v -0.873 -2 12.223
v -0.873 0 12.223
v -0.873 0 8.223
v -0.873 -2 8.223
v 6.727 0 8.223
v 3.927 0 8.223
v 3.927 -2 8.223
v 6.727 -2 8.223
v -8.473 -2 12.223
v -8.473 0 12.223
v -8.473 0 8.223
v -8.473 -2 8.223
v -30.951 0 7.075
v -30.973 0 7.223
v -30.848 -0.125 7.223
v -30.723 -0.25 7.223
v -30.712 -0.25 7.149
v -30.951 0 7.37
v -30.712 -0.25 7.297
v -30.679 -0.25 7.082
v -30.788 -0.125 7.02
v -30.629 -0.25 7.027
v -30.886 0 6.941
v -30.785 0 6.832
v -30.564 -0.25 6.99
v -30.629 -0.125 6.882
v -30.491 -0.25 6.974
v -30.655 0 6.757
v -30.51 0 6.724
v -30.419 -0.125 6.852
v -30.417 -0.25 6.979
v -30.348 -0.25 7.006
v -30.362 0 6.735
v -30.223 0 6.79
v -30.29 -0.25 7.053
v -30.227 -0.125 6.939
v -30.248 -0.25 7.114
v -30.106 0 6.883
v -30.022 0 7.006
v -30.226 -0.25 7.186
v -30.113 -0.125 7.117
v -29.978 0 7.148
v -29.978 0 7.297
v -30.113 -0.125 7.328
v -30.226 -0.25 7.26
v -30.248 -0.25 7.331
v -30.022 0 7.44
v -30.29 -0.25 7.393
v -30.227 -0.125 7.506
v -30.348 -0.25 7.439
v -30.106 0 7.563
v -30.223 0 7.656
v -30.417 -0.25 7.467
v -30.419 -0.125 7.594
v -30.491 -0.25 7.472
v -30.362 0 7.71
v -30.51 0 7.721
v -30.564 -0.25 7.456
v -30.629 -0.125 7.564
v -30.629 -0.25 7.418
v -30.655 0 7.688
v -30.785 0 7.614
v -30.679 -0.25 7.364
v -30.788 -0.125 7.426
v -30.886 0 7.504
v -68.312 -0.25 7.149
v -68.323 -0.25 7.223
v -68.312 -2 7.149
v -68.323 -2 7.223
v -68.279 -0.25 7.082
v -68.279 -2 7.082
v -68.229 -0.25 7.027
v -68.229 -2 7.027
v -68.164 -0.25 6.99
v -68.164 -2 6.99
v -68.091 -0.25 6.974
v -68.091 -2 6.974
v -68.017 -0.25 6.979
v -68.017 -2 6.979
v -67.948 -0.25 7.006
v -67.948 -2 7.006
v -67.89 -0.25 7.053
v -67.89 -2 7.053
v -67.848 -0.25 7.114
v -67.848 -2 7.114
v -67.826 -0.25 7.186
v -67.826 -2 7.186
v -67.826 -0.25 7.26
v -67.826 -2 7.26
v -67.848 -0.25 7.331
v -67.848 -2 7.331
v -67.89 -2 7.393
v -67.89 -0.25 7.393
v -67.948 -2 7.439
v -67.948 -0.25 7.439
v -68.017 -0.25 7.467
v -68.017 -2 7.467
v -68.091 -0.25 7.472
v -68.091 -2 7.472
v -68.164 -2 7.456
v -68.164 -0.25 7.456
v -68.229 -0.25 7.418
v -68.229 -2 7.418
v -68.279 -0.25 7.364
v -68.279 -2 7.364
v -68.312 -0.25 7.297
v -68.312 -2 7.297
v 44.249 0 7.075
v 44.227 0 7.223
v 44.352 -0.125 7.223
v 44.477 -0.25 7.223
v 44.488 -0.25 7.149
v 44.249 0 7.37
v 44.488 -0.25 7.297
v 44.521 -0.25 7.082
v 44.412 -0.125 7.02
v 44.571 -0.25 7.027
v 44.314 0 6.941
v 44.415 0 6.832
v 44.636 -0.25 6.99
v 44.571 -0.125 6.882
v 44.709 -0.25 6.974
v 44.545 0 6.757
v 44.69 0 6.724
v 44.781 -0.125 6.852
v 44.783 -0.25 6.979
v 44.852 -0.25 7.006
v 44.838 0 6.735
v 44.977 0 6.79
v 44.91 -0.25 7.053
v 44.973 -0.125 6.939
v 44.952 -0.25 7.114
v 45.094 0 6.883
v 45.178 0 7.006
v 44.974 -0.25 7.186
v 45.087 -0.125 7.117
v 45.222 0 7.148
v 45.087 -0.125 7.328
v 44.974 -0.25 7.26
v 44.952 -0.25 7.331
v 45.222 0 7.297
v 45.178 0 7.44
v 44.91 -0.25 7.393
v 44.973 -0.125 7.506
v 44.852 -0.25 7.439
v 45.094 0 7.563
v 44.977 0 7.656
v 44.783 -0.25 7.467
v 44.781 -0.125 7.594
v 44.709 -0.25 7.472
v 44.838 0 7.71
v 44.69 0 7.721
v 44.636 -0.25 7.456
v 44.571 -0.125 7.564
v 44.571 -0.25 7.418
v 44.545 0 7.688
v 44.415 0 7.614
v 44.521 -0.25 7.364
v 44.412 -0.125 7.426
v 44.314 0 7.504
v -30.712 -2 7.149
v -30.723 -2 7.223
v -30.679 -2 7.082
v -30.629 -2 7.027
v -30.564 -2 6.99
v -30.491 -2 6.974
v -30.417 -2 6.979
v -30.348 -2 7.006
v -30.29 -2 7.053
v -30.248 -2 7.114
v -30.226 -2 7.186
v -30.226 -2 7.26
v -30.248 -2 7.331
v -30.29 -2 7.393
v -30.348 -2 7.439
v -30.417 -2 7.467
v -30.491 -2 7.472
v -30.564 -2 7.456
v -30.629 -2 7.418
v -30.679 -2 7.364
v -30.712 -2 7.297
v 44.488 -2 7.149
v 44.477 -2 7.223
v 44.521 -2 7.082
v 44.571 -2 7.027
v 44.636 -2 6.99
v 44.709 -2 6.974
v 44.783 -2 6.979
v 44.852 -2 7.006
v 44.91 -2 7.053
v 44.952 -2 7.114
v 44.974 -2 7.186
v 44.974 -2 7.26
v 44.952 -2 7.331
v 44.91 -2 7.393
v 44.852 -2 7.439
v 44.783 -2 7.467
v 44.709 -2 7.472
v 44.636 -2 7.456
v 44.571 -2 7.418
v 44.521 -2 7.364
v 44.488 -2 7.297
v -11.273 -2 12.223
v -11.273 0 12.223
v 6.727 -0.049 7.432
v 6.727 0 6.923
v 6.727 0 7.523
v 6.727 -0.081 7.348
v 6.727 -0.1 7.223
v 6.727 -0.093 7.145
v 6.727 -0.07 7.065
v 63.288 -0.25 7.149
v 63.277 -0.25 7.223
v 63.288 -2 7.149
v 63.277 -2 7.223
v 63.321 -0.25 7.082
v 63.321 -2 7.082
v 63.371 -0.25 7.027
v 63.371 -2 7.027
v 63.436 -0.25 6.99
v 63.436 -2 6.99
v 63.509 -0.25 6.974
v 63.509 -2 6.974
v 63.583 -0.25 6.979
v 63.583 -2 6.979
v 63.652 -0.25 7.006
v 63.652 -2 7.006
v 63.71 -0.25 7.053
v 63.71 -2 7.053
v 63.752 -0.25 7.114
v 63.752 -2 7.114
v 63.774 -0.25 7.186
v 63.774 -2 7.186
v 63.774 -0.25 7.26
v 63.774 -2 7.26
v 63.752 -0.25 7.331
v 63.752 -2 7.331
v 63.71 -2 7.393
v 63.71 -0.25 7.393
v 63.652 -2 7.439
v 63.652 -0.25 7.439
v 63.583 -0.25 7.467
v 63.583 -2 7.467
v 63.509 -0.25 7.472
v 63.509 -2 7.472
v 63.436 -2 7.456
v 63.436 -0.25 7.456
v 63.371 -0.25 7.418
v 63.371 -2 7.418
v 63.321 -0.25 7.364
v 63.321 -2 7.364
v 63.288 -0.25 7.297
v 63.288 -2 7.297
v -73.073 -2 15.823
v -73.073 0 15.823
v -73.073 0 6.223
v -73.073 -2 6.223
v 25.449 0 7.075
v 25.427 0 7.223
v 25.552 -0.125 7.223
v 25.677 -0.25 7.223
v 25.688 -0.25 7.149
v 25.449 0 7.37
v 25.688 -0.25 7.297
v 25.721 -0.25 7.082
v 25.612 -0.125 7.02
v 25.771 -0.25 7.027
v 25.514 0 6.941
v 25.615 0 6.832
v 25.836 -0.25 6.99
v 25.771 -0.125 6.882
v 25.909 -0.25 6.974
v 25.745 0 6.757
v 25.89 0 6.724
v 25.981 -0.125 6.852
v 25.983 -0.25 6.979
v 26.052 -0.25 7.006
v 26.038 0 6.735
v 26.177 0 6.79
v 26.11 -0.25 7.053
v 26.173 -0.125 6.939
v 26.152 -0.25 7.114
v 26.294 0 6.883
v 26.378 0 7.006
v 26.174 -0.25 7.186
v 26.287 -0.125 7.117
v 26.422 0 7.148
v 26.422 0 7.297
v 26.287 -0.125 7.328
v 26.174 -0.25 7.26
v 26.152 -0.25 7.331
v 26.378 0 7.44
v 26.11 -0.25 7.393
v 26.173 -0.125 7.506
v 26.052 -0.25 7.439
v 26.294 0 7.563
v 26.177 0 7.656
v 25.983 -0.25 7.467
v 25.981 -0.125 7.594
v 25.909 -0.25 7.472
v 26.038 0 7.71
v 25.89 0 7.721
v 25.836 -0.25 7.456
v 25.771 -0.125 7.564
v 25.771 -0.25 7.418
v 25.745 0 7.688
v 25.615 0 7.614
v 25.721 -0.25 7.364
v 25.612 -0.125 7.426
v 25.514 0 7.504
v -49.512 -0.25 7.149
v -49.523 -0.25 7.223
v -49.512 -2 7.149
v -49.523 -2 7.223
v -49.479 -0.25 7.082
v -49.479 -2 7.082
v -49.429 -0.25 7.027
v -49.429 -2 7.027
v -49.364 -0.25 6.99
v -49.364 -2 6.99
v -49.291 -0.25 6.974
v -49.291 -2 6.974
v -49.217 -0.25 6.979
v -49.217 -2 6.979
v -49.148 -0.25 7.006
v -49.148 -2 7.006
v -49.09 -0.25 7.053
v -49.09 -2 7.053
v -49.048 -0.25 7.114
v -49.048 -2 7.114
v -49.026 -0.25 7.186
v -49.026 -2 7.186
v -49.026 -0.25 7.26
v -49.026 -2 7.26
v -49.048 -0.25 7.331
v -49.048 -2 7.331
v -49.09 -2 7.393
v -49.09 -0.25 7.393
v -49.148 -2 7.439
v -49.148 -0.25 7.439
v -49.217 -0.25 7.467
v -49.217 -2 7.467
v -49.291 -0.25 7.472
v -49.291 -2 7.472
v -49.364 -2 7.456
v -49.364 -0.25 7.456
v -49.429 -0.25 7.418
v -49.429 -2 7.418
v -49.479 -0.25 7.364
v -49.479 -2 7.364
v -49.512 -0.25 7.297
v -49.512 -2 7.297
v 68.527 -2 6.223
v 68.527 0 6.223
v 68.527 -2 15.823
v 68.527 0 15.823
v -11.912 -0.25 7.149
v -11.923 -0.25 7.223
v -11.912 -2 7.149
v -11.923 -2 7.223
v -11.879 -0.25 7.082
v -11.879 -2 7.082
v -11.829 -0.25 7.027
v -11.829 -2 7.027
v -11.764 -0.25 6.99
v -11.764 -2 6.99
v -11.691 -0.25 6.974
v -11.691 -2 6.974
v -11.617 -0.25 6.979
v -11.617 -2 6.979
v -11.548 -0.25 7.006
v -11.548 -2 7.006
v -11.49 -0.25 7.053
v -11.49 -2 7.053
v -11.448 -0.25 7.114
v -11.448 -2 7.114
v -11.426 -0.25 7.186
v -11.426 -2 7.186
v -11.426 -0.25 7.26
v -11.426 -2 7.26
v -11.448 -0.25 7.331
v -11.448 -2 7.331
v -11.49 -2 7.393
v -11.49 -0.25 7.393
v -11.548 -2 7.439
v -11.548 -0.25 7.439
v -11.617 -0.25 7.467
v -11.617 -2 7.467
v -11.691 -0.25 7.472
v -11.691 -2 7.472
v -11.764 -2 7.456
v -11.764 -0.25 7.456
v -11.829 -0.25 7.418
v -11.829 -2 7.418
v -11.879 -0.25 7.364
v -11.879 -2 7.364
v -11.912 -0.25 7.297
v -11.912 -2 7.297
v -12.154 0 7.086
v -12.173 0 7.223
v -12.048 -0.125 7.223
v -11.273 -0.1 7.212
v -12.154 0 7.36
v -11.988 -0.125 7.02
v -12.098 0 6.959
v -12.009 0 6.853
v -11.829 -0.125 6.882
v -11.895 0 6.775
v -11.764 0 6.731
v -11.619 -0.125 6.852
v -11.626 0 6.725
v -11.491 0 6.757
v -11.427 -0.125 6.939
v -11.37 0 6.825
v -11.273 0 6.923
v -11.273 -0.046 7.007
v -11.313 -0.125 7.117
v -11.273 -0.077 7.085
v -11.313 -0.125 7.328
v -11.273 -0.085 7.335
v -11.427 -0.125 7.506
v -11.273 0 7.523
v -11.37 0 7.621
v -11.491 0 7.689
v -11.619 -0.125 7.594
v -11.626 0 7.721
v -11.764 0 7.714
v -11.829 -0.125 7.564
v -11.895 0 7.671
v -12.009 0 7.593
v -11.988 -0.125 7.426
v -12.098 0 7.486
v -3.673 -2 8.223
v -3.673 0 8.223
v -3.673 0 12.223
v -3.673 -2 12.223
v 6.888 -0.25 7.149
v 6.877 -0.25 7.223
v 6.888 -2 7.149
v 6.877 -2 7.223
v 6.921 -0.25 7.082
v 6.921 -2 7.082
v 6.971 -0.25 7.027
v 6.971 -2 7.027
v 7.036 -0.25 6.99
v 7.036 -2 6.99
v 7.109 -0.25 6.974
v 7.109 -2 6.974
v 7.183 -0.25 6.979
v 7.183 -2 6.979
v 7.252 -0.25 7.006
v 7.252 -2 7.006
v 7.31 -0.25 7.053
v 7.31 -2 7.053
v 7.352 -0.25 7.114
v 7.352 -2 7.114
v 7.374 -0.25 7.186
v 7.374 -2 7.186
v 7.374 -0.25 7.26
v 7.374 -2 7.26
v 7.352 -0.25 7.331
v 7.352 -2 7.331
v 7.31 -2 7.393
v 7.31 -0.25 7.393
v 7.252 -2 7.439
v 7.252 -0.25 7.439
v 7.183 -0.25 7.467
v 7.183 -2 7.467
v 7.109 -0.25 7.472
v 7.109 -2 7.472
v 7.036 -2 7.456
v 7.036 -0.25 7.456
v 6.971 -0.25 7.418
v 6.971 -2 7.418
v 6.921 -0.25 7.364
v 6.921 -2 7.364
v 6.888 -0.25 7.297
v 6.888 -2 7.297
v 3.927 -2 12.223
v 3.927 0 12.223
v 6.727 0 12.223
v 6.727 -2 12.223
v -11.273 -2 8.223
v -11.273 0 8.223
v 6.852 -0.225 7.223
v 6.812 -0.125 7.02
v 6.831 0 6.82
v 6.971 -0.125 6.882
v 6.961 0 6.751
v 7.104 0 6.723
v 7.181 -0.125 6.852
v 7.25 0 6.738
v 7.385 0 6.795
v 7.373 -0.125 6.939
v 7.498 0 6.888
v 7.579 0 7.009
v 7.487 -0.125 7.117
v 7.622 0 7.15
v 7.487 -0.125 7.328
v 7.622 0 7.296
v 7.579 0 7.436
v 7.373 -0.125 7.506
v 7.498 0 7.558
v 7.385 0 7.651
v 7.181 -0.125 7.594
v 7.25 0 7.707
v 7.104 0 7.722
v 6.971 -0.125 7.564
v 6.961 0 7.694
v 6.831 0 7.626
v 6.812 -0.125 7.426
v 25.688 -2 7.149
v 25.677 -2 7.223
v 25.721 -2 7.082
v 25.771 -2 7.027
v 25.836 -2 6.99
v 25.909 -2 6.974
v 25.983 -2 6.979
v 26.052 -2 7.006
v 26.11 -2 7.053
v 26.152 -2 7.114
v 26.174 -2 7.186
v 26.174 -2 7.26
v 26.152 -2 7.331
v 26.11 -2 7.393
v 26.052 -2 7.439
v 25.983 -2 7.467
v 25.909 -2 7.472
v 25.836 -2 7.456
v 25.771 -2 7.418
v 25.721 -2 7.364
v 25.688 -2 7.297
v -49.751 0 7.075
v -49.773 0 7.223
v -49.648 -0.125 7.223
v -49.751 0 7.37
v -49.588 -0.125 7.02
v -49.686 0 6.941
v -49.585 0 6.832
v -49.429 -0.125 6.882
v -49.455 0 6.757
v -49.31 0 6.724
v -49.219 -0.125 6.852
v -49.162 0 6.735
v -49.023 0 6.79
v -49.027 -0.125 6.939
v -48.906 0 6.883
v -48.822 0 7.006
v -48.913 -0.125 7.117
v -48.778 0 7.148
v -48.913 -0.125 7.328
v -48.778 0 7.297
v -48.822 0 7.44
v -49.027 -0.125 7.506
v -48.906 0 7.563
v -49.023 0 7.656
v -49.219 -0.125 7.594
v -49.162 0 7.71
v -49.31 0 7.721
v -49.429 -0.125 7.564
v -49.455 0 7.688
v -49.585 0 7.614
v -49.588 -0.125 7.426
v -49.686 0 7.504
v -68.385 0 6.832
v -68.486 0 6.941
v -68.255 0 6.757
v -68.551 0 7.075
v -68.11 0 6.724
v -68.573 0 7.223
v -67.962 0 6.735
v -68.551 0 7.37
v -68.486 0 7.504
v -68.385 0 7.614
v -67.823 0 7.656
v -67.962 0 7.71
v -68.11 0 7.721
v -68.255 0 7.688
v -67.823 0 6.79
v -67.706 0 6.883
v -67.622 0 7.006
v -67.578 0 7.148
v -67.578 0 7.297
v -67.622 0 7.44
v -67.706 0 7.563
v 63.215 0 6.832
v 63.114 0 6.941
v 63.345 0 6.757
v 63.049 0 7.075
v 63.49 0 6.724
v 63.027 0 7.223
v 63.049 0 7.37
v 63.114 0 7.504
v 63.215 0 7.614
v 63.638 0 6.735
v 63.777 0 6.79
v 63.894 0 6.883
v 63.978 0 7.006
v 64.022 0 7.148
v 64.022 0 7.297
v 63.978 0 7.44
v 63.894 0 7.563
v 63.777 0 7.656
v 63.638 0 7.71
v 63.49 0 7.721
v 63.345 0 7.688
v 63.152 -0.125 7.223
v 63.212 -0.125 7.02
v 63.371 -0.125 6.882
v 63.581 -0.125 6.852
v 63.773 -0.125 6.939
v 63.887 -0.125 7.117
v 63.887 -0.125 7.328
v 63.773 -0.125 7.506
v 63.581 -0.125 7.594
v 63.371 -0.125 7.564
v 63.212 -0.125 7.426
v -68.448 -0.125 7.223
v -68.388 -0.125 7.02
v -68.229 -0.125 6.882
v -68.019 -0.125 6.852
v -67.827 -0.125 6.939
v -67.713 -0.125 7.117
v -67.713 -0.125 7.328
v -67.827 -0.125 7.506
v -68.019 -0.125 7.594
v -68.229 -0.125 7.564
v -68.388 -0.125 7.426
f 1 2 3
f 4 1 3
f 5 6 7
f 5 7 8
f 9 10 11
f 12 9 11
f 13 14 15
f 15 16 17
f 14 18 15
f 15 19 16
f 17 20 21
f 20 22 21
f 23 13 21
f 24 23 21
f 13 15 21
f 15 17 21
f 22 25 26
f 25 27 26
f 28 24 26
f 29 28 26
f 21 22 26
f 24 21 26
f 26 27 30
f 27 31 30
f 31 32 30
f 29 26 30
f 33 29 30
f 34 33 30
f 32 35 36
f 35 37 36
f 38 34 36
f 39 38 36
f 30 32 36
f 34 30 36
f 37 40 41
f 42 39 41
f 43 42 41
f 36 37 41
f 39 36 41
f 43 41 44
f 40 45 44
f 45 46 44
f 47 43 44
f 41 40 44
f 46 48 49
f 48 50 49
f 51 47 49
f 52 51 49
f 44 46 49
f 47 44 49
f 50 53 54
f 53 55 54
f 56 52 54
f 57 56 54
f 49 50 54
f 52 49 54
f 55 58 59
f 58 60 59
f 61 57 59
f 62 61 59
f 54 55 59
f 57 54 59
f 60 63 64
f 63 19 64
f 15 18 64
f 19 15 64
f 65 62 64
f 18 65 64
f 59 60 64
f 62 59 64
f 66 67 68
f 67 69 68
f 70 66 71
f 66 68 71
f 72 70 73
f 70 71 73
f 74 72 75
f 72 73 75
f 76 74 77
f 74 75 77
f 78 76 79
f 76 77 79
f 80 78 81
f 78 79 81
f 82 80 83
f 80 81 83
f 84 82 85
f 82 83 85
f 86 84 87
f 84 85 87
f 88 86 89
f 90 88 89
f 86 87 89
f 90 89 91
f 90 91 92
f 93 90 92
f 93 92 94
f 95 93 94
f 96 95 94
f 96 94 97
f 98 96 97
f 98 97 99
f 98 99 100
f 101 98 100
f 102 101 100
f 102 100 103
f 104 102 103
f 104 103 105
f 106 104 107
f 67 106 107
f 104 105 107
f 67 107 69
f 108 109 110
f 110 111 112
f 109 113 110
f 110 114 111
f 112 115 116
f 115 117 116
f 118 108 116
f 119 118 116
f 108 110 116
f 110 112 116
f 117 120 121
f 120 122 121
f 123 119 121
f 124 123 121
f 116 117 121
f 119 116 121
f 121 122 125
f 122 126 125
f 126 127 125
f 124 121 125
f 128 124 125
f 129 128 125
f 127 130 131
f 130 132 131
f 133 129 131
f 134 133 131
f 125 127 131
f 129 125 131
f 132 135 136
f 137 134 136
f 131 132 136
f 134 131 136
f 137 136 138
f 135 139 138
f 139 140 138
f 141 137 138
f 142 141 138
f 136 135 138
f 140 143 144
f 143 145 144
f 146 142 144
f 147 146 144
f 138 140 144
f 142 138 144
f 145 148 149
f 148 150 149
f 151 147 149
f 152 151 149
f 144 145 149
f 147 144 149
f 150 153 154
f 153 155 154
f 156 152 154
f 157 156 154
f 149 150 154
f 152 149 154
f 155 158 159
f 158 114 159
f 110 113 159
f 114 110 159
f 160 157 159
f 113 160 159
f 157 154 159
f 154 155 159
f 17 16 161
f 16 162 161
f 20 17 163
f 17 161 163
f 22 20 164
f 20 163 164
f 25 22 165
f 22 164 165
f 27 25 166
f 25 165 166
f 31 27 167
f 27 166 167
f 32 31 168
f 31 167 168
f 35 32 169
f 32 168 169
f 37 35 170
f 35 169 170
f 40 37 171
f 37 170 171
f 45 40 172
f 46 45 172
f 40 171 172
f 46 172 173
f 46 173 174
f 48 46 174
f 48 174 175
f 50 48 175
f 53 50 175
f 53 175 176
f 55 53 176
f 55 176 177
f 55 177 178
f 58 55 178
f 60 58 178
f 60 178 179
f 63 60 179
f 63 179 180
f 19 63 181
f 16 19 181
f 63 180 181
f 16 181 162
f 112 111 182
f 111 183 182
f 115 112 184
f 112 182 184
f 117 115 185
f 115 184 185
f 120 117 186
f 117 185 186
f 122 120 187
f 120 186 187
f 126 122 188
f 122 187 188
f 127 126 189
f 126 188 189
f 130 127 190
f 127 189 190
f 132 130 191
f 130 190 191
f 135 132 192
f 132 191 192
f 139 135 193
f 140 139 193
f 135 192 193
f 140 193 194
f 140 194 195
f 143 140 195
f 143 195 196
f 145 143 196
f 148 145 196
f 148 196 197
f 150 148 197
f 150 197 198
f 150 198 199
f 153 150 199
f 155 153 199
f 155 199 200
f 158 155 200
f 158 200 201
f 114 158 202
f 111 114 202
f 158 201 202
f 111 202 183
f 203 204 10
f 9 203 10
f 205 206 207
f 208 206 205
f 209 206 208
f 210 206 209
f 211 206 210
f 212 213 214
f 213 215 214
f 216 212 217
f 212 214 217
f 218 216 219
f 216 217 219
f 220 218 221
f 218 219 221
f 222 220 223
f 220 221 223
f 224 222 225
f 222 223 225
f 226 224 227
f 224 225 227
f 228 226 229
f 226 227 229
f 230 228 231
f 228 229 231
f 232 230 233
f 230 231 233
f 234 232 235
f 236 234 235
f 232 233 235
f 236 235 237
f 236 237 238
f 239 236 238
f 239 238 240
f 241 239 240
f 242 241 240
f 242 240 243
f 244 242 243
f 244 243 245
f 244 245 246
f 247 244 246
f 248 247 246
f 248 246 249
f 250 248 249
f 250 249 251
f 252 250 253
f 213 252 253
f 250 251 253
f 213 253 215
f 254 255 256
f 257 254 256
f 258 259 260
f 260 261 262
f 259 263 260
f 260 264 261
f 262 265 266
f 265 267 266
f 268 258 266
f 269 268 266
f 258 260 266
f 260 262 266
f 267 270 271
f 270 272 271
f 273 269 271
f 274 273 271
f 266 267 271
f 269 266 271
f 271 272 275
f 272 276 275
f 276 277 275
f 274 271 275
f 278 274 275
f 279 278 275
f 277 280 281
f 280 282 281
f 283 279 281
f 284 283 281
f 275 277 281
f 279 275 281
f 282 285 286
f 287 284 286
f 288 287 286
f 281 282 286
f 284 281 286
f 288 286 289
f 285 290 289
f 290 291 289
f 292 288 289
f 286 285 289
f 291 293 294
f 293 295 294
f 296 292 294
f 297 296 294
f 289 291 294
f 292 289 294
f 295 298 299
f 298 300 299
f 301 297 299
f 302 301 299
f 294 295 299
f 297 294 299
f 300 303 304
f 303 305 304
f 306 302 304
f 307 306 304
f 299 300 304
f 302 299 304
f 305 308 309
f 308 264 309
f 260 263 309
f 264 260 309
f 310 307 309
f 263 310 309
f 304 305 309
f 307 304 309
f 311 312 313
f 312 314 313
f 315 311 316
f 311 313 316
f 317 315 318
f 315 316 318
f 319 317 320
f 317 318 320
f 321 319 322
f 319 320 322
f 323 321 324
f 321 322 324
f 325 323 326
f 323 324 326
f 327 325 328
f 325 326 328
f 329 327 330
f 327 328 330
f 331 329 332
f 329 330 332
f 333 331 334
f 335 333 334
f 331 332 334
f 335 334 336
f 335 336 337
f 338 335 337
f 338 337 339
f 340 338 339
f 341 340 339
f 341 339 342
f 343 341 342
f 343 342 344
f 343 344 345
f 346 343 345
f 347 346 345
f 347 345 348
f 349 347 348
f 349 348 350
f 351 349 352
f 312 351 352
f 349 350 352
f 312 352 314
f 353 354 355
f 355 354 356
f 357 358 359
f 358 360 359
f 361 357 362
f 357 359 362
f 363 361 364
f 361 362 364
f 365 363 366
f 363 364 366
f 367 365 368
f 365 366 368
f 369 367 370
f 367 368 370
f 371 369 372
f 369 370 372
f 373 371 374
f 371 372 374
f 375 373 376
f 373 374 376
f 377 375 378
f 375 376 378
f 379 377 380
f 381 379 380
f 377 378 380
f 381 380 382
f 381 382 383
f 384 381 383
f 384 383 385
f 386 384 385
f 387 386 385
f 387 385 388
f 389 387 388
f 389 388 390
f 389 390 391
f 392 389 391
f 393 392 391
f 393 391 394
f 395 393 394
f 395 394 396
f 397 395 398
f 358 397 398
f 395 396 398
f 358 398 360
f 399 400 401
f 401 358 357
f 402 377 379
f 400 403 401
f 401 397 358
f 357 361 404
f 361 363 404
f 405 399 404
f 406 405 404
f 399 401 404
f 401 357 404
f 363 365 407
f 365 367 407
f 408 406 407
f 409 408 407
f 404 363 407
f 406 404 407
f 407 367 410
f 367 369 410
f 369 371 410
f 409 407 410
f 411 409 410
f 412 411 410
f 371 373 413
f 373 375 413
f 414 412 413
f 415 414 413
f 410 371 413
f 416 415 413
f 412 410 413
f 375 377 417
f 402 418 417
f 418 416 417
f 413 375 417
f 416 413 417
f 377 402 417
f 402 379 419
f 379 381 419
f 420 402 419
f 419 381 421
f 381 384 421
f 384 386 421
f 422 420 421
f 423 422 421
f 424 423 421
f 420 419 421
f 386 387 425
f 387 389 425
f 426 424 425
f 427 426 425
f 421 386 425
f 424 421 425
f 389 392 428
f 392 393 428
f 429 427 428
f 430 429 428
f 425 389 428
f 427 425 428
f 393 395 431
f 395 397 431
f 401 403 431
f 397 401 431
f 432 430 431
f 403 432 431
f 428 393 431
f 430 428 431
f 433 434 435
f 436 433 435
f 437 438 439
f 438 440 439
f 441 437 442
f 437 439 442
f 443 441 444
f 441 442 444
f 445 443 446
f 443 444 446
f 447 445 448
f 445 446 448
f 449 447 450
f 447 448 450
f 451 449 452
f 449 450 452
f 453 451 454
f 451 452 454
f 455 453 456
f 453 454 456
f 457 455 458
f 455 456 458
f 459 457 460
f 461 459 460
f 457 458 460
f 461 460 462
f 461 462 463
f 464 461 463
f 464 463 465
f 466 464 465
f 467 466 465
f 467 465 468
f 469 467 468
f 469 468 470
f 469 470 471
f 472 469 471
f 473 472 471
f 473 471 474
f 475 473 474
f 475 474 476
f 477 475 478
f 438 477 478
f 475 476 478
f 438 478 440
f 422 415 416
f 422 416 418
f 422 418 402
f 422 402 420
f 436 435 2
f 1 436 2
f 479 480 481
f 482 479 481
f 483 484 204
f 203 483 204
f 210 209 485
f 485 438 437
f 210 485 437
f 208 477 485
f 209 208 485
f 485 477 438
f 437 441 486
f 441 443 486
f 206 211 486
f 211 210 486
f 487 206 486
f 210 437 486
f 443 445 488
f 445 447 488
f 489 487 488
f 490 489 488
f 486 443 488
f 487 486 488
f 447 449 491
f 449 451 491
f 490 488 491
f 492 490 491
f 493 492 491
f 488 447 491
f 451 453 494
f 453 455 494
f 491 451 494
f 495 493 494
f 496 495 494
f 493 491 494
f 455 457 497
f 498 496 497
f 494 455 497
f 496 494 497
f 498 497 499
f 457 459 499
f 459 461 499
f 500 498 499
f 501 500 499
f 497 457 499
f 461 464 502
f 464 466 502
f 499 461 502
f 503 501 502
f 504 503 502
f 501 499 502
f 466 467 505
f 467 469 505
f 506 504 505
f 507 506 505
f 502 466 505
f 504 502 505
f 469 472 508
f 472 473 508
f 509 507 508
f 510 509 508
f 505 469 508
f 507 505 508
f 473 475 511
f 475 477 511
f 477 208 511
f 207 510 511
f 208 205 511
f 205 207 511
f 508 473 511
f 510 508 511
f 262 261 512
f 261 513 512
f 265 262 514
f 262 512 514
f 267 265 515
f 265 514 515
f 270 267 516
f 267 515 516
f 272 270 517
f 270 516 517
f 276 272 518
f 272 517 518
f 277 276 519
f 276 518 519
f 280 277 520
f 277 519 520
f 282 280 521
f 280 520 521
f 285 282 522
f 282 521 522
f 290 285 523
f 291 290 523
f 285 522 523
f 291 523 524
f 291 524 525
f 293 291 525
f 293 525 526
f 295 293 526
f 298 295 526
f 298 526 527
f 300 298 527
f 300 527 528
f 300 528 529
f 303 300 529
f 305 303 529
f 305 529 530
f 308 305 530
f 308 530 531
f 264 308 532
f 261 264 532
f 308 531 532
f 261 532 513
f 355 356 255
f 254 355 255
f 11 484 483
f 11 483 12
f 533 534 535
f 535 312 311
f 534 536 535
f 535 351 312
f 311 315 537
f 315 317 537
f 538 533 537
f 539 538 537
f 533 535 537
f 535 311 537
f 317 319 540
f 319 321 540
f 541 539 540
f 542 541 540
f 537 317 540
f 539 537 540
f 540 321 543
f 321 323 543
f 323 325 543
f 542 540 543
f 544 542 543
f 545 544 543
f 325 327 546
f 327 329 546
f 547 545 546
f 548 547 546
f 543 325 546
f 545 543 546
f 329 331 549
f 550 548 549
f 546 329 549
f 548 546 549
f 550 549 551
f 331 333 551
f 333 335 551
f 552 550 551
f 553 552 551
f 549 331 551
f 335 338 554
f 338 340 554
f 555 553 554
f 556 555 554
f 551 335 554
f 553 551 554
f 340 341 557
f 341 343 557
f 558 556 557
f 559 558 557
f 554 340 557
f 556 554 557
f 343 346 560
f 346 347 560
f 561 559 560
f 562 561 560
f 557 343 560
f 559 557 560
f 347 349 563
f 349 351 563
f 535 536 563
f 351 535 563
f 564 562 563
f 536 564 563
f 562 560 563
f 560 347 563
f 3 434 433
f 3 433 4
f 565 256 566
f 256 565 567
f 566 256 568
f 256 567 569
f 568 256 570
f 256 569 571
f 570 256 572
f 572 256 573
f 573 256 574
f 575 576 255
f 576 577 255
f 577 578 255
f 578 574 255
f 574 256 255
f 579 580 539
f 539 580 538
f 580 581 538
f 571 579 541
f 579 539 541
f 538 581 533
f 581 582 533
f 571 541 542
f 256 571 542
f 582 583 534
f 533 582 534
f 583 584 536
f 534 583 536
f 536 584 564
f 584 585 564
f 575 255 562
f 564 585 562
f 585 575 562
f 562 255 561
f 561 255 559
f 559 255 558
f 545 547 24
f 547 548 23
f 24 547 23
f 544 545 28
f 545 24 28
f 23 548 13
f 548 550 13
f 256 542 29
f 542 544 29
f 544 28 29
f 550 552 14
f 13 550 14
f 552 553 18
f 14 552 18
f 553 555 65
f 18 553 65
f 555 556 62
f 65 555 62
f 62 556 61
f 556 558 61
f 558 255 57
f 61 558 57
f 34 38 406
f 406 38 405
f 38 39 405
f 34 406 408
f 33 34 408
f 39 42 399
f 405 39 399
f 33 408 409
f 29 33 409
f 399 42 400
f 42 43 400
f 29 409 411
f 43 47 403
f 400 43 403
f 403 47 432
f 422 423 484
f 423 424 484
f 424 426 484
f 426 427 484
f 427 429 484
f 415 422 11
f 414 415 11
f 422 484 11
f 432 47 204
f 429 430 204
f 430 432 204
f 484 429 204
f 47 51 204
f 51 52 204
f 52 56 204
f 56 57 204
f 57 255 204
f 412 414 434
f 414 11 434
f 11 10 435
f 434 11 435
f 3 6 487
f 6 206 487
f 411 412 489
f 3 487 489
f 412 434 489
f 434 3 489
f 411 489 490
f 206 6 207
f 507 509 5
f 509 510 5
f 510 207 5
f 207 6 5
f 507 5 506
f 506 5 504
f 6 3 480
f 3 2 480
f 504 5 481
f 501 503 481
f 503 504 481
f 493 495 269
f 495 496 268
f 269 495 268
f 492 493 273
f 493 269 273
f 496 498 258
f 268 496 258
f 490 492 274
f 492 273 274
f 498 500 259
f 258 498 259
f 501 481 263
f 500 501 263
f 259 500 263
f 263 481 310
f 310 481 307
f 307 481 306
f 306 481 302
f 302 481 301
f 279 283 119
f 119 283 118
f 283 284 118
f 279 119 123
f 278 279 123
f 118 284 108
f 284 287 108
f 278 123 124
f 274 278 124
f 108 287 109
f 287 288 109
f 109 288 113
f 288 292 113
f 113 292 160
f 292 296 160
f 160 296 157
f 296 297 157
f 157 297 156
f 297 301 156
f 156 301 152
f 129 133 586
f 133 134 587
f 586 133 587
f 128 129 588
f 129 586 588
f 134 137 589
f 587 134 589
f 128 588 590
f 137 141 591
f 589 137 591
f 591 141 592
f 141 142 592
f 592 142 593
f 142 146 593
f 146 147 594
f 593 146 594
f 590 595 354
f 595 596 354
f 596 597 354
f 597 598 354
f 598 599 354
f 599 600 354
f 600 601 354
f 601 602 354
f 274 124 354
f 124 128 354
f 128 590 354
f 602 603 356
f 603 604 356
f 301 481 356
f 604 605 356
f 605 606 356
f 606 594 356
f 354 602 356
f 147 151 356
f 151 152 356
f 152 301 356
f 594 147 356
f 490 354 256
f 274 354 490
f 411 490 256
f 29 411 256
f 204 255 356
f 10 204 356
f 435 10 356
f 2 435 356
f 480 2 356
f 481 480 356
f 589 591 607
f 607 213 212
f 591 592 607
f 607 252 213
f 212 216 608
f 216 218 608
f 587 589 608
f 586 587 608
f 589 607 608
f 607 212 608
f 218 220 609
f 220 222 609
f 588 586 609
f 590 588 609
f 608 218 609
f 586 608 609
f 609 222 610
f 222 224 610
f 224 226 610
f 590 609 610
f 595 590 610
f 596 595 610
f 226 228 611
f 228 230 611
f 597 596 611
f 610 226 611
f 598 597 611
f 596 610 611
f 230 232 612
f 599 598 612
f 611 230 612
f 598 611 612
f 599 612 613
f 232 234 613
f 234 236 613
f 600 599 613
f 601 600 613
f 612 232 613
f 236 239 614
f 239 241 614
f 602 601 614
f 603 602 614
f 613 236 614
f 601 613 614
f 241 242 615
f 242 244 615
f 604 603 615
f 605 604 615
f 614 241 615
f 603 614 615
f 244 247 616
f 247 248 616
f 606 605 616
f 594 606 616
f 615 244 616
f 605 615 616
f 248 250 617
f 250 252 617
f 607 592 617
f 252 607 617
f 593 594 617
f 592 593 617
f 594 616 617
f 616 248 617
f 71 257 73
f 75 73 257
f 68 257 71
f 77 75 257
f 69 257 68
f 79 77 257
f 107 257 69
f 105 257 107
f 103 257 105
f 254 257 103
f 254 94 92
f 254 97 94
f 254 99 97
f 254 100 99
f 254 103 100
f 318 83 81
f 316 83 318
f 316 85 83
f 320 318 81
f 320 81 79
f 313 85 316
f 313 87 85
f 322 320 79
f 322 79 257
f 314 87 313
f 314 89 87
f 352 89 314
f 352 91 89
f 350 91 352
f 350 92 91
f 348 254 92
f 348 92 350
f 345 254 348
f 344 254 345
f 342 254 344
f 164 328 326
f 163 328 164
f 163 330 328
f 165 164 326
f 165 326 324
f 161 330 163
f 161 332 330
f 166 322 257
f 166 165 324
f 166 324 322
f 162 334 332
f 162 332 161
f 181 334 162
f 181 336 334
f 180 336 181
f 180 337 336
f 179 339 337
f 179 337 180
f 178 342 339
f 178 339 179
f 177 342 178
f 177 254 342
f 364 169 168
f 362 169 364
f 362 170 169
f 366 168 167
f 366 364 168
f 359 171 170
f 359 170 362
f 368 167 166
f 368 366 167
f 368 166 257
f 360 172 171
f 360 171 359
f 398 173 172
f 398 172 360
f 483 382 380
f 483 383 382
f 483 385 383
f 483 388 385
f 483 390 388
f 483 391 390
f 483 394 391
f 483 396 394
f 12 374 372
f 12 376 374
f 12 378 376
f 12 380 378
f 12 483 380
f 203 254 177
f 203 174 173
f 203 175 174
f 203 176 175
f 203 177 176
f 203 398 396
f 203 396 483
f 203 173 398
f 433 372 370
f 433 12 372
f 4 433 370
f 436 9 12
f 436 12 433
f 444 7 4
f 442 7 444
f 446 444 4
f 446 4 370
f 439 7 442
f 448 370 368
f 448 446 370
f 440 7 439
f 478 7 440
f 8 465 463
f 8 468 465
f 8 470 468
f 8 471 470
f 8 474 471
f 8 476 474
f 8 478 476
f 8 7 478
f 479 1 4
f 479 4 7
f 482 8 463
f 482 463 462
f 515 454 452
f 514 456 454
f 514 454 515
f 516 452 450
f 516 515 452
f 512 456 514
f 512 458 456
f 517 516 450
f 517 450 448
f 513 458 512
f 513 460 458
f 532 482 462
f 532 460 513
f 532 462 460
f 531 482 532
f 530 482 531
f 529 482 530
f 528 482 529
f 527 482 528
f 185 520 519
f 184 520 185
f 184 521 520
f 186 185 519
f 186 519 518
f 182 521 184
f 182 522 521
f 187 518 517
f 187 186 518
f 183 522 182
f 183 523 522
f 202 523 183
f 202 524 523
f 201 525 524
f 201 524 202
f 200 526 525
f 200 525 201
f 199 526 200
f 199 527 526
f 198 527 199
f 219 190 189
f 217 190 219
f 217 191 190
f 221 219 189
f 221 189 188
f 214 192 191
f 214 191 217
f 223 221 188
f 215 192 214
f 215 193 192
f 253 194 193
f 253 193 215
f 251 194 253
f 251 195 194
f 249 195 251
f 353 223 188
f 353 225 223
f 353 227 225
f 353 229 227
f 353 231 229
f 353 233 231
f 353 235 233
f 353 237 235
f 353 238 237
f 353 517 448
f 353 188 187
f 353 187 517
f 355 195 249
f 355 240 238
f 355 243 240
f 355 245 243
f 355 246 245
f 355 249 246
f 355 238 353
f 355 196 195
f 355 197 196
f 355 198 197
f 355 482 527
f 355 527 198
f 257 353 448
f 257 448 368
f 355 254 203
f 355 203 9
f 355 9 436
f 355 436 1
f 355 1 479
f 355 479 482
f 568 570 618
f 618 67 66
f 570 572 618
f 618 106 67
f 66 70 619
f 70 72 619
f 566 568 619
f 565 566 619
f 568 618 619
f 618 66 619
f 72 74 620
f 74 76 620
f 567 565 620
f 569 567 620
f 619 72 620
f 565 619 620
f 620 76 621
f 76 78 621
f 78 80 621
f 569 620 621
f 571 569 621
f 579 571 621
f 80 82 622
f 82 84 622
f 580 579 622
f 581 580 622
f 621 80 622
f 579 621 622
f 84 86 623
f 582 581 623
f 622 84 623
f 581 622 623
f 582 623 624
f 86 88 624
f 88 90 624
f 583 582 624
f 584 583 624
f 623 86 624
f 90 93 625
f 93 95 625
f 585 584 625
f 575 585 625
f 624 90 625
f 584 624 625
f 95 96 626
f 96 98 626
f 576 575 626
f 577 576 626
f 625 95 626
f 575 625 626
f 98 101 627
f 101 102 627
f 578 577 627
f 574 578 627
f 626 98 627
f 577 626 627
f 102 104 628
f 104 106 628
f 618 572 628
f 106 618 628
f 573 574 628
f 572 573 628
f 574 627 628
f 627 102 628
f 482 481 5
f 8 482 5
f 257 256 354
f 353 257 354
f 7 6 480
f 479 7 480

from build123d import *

# Parameters (mm, degrees)
F1_DEPTH       = 2
F2_D           = 0.5
F2_CSINK_D     = 1
F2_CSINK_ANGLE = 90
F0_W           = 2.8
F0_H           = 2
F3_DEPTH       = 2


with BuildPart() as f1:
    # F0 (on Front) → F1 (new body)
    with BuildSketch(Plane.XZ):
        Polygon((68.5272171855, 15.8228288673), (-73.0727828145, 15.8228288673), (-73.0727828145, 6.2228288673), (-11.2727828145, 6.2228288673), (-11.2727828145, 8.2228288673), (-11.2727828145, 12.2228288673), (-8.4727828145, 12.2228288673), (-8.4727828145, 8.2228288673), (-8.4727828145, 6.2228288673), (-3.6727828145, 6.2228288673), (-3.6727828145, 8.2228288673), (-3.6727828145, 12.2228288673), (-0.8727828145, 12.2228288673), (-0.8727828145, 8.2228288673), (-0.8727828145, 6.2228288673), (3.9272171855, 6.2228288673), (3.9272171855, 8.2228288673), (3.9272171855, 12.2228288673), (6.7272171855, 12.2228288673), (6.7272171855, 8.2228288673), (6.7272171855, 6.2228288673), (68.5272171855, 6.2228288673), align=None)
    extrude(amount=F1_DEPTH)

    # F2 (through all)
    with Locations(Plane(origin=(0, 0, 0), x_dir=(1, 0, 0), z_dir=(0, 1, 0))):
        with Locations((63.5272171855, -7.2228288673), (44.7272171855, -7.2228288673), (25.9272171855, -7.2228288673), (7.1272171855, -7.2228288673), (-11.6727828145, -7.2228288673), (-30.4727828145, -7.2228288673), (-49.2727828145, -7.2228288673), (-68.0727828145, -7.2228288673)):
            CounterSinkHole(F2_D / 2, F2_CSINK_D / 2, counter_sink_angle=F2_CSINK_ANGLE)

    # F0 (on Front) → F3 (join)
    with BuildSketch(Plane.XZ):
        with Locations((-9.8727828145, 7.2228288673)):
            Rectangle(F0_W, F0_H)
        with Locations((-2.2727828145, 7.2228288673)):
            Rectangle(F0_W, F0_H)
        with Locations((5.3272171855, 7.2228288673)):
            Rectangle(F0_W, F0_H)
    extrude(amount=F3_DEPTH)


solid = f1.part
